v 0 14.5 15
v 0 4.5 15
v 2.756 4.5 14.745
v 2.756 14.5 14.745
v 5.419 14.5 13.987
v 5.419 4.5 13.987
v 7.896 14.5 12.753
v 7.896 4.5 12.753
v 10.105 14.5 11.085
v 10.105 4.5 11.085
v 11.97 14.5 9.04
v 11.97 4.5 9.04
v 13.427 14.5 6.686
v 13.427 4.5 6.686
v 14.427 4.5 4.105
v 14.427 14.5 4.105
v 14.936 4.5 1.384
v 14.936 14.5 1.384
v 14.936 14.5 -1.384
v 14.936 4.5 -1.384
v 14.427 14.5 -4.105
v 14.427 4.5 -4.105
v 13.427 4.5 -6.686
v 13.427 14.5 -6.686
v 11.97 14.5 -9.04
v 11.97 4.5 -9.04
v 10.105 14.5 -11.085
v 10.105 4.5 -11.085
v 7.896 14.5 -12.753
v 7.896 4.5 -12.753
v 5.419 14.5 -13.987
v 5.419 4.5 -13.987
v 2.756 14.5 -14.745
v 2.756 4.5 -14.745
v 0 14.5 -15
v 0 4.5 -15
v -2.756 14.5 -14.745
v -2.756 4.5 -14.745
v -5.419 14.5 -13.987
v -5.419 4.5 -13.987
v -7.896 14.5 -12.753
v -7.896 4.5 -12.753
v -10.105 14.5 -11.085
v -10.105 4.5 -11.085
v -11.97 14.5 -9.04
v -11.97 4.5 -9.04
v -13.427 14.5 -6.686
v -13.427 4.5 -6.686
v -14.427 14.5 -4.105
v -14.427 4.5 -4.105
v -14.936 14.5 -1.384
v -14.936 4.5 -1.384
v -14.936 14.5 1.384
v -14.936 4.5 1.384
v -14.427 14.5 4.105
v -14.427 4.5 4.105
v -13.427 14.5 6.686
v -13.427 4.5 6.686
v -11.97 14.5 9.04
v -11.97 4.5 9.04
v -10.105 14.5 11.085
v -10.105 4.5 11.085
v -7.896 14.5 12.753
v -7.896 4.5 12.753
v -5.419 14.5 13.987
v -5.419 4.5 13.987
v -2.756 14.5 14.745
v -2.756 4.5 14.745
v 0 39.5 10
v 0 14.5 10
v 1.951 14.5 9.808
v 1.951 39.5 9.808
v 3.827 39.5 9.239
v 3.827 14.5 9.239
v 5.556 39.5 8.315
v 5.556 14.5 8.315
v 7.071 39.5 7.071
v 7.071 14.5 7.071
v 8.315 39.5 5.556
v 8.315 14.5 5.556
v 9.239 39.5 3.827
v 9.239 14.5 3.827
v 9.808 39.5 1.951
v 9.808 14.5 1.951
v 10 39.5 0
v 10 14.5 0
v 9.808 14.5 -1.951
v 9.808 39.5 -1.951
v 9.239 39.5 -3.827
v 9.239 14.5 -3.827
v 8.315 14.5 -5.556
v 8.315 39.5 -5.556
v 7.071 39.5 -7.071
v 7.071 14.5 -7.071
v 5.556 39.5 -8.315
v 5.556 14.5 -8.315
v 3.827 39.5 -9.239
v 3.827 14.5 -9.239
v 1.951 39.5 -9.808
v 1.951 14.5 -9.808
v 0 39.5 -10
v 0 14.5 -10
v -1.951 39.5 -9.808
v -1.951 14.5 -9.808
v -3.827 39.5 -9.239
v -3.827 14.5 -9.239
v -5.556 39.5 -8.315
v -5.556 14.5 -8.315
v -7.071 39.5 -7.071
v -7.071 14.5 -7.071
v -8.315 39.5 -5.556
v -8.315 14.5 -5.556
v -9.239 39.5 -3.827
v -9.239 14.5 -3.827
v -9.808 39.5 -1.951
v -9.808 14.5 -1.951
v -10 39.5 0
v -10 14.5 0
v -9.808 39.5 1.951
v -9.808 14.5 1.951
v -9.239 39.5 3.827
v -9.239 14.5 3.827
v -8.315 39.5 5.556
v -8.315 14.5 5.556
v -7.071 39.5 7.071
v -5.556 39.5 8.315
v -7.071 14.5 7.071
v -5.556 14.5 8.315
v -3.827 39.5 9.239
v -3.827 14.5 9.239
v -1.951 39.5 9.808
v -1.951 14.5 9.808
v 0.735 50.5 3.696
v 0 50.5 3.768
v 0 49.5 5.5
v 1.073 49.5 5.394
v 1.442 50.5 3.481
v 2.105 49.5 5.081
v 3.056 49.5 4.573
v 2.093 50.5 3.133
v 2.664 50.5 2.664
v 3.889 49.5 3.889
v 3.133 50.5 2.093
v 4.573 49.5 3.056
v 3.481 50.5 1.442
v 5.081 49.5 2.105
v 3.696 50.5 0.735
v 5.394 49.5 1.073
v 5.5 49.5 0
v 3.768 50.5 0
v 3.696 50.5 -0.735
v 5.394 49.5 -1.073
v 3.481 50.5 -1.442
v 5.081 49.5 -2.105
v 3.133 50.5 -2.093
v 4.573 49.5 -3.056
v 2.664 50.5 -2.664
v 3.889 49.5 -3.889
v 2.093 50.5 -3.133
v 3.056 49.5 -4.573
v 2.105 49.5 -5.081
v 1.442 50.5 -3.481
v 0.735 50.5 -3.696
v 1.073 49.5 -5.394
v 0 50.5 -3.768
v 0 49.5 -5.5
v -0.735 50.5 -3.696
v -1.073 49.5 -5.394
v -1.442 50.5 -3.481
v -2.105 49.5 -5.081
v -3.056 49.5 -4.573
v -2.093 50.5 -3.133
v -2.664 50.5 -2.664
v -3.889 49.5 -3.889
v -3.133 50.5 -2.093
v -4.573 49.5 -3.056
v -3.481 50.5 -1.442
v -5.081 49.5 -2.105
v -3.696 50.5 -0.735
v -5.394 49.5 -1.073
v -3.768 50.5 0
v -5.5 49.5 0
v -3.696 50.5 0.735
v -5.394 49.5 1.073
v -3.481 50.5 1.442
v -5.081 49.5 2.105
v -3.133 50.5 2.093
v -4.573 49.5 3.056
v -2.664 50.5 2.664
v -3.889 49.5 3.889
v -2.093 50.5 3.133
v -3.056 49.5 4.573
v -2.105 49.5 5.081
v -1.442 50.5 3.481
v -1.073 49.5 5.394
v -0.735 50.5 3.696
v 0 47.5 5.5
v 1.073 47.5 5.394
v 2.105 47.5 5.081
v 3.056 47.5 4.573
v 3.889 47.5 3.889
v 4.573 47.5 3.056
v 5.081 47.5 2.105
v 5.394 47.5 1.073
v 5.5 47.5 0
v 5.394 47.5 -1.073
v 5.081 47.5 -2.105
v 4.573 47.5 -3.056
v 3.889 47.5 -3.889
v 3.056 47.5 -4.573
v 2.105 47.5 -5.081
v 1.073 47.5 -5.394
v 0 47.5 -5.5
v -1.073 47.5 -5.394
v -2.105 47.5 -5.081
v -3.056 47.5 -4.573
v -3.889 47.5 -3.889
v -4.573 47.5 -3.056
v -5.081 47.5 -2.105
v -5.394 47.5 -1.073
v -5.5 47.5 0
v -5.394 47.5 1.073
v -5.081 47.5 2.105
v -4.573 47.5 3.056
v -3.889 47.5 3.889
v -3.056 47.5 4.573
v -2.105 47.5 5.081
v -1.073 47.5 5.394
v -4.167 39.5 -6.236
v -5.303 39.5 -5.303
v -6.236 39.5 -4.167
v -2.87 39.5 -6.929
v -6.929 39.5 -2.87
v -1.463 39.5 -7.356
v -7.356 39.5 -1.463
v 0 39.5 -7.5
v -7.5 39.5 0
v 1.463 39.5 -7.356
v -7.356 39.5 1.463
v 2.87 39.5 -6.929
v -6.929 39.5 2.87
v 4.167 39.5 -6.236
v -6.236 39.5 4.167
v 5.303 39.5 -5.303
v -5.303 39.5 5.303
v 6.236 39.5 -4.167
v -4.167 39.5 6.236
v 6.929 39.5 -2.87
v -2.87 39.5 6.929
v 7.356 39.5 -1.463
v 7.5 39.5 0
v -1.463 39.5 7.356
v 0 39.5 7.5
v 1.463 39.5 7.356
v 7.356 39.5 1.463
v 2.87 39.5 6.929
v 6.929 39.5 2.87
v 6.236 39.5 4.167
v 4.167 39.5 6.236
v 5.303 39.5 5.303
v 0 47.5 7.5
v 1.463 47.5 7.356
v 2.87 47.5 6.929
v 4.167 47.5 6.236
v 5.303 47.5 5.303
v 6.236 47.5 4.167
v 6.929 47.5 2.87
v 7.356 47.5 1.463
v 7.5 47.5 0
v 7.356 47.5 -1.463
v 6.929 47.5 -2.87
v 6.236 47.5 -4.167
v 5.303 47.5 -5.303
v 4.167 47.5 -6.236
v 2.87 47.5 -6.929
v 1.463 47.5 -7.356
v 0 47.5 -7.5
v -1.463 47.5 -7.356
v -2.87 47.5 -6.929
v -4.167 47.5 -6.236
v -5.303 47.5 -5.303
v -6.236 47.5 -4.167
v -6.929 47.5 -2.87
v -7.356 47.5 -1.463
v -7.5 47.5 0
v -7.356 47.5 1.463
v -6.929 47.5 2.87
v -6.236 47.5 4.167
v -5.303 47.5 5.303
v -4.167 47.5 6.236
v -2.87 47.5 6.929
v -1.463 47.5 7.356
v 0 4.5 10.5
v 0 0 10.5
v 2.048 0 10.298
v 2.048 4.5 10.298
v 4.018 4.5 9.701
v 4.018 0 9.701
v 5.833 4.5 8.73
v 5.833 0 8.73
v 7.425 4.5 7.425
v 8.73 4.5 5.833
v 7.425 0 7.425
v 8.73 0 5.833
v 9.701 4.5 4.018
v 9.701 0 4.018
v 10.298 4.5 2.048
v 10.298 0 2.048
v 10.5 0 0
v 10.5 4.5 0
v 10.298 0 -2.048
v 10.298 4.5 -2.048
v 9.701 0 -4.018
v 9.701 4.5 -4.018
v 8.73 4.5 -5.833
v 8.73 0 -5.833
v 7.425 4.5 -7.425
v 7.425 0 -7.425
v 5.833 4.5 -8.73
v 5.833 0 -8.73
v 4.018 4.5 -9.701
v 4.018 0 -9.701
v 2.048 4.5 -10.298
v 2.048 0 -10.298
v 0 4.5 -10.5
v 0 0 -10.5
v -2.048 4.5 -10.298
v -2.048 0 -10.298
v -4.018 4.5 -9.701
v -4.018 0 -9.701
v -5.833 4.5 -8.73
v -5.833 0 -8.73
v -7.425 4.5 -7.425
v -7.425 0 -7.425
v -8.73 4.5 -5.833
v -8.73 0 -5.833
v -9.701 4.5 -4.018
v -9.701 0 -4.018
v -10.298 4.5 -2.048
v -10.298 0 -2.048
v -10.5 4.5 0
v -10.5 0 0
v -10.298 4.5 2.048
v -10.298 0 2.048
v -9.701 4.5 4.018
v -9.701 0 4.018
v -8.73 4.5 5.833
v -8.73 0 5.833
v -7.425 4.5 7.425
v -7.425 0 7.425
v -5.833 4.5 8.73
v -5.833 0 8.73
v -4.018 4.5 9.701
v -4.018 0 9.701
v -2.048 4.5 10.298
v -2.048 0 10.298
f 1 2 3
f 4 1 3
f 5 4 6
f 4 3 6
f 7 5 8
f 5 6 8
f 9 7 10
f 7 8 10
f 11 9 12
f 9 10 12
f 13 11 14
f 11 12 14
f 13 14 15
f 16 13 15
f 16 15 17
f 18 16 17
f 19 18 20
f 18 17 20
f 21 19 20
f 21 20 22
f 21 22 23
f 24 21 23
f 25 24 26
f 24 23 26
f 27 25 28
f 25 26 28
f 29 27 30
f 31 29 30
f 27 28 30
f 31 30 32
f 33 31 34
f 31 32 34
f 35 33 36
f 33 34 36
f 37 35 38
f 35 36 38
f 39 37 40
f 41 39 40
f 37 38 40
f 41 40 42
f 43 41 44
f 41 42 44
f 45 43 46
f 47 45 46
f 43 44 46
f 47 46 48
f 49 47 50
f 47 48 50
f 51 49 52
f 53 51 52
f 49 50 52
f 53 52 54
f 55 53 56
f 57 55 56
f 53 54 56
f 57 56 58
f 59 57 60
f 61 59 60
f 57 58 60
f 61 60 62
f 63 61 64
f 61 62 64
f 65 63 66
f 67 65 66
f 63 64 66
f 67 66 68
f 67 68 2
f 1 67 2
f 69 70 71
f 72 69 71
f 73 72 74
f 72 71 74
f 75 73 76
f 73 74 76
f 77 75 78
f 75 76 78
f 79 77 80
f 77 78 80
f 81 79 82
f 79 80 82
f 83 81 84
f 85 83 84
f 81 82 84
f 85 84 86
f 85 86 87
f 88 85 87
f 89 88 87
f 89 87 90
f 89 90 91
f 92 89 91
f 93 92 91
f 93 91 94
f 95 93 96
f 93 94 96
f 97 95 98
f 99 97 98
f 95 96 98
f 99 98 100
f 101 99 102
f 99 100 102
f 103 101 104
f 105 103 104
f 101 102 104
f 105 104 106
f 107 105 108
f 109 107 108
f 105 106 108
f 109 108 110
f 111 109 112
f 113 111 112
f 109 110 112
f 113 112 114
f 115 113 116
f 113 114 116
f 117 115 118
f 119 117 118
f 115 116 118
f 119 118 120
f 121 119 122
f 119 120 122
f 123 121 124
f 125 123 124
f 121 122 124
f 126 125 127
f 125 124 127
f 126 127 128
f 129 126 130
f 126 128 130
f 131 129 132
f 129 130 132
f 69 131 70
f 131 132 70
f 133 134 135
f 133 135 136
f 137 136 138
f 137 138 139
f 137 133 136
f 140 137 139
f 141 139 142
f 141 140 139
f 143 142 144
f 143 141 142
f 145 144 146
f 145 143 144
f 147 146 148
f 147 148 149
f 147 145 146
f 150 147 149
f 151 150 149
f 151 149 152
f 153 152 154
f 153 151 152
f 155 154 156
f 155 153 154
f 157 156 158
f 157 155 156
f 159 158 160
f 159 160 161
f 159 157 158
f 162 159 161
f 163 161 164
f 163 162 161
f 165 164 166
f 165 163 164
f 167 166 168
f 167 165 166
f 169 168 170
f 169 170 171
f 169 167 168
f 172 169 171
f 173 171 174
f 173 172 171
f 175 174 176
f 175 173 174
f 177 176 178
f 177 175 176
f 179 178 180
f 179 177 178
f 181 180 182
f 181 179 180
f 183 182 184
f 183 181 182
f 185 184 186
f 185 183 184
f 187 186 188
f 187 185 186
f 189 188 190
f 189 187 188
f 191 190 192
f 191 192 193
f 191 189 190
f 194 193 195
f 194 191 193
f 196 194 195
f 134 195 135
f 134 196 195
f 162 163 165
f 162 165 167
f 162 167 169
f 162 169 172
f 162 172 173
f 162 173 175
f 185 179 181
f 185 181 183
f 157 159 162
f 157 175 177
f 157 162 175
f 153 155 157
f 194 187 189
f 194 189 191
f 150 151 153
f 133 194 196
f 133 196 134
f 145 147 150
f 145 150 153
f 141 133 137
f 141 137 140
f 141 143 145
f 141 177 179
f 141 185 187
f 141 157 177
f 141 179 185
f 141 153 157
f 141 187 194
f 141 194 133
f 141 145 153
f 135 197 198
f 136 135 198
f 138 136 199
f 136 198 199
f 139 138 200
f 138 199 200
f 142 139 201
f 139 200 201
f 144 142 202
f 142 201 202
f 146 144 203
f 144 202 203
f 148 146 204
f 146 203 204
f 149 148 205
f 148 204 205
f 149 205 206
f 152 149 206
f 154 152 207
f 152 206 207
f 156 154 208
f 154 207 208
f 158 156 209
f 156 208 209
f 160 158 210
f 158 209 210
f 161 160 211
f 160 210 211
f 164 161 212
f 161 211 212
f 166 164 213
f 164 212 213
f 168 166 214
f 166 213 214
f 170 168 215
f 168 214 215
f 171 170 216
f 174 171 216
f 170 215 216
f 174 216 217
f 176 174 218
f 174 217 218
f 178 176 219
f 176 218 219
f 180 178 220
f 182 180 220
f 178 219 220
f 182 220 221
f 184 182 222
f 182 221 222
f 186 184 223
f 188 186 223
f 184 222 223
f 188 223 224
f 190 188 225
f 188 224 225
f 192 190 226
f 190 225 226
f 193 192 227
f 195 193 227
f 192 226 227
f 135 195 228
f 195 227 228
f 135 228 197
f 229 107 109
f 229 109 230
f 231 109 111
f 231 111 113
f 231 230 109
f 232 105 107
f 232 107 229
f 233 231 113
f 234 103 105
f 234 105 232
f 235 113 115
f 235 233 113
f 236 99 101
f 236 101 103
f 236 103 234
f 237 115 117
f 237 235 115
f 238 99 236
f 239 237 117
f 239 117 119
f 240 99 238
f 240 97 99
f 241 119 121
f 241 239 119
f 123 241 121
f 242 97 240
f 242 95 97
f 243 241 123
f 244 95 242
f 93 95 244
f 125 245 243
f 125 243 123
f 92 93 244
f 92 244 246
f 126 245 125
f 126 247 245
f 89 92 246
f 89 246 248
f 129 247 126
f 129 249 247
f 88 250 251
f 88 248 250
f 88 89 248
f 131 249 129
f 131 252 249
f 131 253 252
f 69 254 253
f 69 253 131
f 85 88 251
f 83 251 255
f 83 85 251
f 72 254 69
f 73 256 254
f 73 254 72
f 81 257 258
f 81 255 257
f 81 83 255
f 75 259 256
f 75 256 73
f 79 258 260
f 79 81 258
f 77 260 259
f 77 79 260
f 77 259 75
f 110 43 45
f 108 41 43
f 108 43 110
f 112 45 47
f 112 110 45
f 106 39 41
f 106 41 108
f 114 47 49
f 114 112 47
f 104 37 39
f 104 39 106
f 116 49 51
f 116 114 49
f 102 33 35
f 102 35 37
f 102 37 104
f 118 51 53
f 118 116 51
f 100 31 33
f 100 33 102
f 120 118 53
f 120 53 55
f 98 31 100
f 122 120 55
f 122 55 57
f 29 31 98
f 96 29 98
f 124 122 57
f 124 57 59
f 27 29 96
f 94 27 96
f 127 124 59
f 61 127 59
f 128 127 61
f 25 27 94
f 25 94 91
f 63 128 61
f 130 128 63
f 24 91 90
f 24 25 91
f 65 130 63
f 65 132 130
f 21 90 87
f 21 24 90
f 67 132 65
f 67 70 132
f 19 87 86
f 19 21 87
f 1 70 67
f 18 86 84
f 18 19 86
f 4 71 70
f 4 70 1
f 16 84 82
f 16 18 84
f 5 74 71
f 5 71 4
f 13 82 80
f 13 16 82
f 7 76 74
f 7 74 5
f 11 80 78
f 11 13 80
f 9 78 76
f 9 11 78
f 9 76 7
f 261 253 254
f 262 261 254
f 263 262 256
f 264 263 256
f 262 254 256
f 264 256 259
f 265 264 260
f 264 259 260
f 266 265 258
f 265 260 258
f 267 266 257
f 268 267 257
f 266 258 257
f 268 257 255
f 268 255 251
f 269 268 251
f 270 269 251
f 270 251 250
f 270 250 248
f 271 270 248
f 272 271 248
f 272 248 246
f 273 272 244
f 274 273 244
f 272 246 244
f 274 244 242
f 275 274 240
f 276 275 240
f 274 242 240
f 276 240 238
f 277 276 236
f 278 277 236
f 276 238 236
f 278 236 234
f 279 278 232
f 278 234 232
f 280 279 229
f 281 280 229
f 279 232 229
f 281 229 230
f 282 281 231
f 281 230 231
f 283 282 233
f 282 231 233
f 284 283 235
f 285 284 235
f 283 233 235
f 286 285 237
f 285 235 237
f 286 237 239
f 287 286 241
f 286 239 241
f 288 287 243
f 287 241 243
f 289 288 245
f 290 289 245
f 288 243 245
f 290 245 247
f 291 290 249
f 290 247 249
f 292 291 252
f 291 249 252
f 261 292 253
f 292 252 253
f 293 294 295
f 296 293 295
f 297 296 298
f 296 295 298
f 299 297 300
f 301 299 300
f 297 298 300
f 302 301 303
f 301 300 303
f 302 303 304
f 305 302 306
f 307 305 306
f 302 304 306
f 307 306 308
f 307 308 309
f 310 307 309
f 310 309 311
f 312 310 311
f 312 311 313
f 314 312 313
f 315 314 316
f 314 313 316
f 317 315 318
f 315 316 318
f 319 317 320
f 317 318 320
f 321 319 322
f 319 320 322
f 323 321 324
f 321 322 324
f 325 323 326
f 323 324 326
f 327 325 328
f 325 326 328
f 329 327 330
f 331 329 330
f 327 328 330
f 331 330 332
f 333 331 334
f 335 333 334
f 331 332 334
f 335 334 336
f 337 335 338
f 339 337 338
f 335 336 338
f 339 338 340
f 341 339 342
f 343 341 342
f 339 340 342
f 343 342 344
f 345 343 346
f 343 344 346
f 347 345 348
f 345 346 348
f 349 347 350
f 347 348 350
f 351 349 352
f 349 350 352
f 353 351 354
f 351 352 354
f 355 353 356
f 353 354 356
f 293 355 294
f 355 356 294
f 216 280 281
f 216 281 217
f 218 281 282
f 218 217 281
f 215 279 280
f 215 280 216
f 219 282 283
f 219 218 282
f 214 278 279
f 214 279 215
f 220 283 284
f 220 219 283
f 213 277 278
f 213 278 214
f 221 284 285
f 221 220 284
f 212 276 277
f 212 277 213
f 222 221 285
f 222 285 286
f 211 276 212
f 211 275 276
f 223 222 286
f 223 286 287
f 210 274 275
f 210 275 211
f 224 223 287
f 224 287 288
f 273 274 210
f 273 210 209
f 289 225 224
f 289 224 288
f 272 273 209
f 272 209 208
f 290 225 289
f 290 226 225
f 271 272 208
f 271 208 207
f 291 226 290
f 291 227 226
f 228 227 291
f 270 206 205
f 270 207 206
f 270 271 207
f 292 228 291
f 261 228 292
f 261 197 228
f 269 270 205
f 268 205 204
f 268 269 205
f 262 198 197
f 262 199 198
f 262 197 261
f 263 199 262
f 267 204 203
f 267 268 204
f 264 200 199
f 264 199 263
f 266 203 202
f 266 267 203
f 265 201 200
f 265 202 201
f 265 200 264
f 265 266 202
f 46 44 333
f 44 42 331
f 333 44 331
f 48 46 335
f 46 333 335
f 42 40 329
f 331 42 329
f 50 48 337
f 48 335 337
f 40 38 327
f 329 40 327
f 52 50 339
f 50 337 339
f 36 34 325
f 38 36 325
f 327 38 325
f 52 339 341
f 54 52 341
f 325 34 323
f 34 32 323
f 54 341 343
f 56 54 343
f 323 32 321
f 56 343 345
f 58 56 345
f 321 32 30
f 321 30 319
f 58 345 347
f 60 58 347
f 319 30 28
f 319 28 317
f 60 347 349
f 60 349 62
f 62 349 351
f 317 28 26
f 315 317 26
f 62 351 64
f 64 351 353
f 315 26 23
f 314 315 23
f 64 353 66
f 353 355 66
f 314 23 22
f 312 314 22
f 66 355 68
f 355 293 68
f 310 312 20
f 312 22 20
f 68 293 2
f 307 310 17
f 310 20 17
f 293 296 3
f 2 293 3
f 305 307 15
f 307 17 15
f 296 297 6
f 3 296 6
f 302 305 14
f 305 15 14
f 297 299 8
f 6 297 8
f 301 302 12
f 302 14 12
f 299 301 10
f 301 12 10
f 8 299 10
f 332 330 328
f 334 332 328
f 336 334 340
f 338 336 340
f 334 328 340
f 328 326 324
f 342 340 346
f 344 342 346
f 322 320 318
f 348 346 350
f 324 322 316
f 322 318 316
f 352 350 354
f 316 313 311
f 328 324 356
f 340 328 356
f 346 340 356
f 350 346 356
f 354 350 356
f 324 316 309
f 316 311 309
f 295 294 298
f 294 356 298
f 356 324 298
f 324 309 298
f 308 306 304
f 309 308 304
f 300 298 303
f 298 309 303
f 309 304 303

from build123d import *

# Parameters (mm, degrees)
SKETCH1_R           = 10.5
BOSS_EXTRUDE1_DEPTH = 4.5
SKETCH2_R           = 15
BOSS_EXTRUDE2_DEPTH = 10
SKETCH3_R           = 10
BOSS_EXTRUDE3_DEPTH = 25
SKETCH4_R           = 7.5
BOSS_EXTRUDE4_DEPTH = 8
SKETCH5_R           = 5.5
BOSS_EXTRUDE5_DEPTH = 3
CHAMFER1_SIZE       = 1
CHAMFER1_SIZE2      = 1.732050808


with BuildPart() as part:
    # Sketch1 → Boss-Extrude1 (new body)
    with BuildSketch(Plane(origin=(0, 0, 0), x_dir=(1, 0, 0), z_dir=(0, 1, 0))):
        with Locations(Location((0, 0, 0), (0, 0, 270))):
            Circle(SKETCH1_R)
    extrude(amount=BOSS_EXTRUDE1_DEPTH)

    # Sketch2 → Boss-Extrude2 (add)
    with BuildSketch(Plane(origin=(0, 4.5, 0), x_dir=(1, 0, 0), z_dir=(0, 1, 0))):
        with Locations(Location((0, 0, 0), (0, 0, 270))):
            Circle(SKETCH2_R)
    extrude(amount=BOSS_EXTRUDE2_DEPTH)

    # Sketch3 → Boss-Extrude3 (add)
    with BuildSketch(Plane(origin=(0, 14.5, 0), x_dir=(1, 0, 0), z_dir=(0, 1, 0))):
        with Locations(Location((0, 0, 0), (0, 0, 270))):
            Circle(SKETCH3_R)
    extrude(amount=BOSS_EXTRUDE3_DEPTH)

    # Sketch4 → Boss-Extrude4 (add)
    with BuildSketch(Plane(origin=(0, 39.5, 0), x_dir=(1, 0, 0), z_dir=(0, 1, 0))):
        with Locations(Location((0, 0, 0), (0, 0, 270))):
            Circle(SKETCH4_R)
    extrude(amount=BOSS_EXTRUDE4_DEPTH)

    # Sketch5 → Boss-Extrude5 (add)
    with BuildSketch(Plane(origin=(0, 47.5, 0), x_dir=(1, 0, 0), z_dir=(0, 1, 0))):
        with Locations(Location((0, 0, 0), (0, 0, 270))):
            Circle(SKETCH5_R)
    extrude(amount=BOSS_EXTRUDE5_DEPTH)

    # Chamfer1
    chamfer1_edges = [part.edges().sort_by_distance(p)[0] for p in [
        (0, 50.5, -5.5),
    ]]
    chamfer1_side = [part.faces().sort_by_distance(p)[0] for p in [
        (0, 49, -5.5),
    ]]
    chamfer(chamfer1_edges, length=CHAMFER1_SIZE, length2=CHAMFER1_SIZE2, reference=chamfer1_side[0])


solid = part.part
